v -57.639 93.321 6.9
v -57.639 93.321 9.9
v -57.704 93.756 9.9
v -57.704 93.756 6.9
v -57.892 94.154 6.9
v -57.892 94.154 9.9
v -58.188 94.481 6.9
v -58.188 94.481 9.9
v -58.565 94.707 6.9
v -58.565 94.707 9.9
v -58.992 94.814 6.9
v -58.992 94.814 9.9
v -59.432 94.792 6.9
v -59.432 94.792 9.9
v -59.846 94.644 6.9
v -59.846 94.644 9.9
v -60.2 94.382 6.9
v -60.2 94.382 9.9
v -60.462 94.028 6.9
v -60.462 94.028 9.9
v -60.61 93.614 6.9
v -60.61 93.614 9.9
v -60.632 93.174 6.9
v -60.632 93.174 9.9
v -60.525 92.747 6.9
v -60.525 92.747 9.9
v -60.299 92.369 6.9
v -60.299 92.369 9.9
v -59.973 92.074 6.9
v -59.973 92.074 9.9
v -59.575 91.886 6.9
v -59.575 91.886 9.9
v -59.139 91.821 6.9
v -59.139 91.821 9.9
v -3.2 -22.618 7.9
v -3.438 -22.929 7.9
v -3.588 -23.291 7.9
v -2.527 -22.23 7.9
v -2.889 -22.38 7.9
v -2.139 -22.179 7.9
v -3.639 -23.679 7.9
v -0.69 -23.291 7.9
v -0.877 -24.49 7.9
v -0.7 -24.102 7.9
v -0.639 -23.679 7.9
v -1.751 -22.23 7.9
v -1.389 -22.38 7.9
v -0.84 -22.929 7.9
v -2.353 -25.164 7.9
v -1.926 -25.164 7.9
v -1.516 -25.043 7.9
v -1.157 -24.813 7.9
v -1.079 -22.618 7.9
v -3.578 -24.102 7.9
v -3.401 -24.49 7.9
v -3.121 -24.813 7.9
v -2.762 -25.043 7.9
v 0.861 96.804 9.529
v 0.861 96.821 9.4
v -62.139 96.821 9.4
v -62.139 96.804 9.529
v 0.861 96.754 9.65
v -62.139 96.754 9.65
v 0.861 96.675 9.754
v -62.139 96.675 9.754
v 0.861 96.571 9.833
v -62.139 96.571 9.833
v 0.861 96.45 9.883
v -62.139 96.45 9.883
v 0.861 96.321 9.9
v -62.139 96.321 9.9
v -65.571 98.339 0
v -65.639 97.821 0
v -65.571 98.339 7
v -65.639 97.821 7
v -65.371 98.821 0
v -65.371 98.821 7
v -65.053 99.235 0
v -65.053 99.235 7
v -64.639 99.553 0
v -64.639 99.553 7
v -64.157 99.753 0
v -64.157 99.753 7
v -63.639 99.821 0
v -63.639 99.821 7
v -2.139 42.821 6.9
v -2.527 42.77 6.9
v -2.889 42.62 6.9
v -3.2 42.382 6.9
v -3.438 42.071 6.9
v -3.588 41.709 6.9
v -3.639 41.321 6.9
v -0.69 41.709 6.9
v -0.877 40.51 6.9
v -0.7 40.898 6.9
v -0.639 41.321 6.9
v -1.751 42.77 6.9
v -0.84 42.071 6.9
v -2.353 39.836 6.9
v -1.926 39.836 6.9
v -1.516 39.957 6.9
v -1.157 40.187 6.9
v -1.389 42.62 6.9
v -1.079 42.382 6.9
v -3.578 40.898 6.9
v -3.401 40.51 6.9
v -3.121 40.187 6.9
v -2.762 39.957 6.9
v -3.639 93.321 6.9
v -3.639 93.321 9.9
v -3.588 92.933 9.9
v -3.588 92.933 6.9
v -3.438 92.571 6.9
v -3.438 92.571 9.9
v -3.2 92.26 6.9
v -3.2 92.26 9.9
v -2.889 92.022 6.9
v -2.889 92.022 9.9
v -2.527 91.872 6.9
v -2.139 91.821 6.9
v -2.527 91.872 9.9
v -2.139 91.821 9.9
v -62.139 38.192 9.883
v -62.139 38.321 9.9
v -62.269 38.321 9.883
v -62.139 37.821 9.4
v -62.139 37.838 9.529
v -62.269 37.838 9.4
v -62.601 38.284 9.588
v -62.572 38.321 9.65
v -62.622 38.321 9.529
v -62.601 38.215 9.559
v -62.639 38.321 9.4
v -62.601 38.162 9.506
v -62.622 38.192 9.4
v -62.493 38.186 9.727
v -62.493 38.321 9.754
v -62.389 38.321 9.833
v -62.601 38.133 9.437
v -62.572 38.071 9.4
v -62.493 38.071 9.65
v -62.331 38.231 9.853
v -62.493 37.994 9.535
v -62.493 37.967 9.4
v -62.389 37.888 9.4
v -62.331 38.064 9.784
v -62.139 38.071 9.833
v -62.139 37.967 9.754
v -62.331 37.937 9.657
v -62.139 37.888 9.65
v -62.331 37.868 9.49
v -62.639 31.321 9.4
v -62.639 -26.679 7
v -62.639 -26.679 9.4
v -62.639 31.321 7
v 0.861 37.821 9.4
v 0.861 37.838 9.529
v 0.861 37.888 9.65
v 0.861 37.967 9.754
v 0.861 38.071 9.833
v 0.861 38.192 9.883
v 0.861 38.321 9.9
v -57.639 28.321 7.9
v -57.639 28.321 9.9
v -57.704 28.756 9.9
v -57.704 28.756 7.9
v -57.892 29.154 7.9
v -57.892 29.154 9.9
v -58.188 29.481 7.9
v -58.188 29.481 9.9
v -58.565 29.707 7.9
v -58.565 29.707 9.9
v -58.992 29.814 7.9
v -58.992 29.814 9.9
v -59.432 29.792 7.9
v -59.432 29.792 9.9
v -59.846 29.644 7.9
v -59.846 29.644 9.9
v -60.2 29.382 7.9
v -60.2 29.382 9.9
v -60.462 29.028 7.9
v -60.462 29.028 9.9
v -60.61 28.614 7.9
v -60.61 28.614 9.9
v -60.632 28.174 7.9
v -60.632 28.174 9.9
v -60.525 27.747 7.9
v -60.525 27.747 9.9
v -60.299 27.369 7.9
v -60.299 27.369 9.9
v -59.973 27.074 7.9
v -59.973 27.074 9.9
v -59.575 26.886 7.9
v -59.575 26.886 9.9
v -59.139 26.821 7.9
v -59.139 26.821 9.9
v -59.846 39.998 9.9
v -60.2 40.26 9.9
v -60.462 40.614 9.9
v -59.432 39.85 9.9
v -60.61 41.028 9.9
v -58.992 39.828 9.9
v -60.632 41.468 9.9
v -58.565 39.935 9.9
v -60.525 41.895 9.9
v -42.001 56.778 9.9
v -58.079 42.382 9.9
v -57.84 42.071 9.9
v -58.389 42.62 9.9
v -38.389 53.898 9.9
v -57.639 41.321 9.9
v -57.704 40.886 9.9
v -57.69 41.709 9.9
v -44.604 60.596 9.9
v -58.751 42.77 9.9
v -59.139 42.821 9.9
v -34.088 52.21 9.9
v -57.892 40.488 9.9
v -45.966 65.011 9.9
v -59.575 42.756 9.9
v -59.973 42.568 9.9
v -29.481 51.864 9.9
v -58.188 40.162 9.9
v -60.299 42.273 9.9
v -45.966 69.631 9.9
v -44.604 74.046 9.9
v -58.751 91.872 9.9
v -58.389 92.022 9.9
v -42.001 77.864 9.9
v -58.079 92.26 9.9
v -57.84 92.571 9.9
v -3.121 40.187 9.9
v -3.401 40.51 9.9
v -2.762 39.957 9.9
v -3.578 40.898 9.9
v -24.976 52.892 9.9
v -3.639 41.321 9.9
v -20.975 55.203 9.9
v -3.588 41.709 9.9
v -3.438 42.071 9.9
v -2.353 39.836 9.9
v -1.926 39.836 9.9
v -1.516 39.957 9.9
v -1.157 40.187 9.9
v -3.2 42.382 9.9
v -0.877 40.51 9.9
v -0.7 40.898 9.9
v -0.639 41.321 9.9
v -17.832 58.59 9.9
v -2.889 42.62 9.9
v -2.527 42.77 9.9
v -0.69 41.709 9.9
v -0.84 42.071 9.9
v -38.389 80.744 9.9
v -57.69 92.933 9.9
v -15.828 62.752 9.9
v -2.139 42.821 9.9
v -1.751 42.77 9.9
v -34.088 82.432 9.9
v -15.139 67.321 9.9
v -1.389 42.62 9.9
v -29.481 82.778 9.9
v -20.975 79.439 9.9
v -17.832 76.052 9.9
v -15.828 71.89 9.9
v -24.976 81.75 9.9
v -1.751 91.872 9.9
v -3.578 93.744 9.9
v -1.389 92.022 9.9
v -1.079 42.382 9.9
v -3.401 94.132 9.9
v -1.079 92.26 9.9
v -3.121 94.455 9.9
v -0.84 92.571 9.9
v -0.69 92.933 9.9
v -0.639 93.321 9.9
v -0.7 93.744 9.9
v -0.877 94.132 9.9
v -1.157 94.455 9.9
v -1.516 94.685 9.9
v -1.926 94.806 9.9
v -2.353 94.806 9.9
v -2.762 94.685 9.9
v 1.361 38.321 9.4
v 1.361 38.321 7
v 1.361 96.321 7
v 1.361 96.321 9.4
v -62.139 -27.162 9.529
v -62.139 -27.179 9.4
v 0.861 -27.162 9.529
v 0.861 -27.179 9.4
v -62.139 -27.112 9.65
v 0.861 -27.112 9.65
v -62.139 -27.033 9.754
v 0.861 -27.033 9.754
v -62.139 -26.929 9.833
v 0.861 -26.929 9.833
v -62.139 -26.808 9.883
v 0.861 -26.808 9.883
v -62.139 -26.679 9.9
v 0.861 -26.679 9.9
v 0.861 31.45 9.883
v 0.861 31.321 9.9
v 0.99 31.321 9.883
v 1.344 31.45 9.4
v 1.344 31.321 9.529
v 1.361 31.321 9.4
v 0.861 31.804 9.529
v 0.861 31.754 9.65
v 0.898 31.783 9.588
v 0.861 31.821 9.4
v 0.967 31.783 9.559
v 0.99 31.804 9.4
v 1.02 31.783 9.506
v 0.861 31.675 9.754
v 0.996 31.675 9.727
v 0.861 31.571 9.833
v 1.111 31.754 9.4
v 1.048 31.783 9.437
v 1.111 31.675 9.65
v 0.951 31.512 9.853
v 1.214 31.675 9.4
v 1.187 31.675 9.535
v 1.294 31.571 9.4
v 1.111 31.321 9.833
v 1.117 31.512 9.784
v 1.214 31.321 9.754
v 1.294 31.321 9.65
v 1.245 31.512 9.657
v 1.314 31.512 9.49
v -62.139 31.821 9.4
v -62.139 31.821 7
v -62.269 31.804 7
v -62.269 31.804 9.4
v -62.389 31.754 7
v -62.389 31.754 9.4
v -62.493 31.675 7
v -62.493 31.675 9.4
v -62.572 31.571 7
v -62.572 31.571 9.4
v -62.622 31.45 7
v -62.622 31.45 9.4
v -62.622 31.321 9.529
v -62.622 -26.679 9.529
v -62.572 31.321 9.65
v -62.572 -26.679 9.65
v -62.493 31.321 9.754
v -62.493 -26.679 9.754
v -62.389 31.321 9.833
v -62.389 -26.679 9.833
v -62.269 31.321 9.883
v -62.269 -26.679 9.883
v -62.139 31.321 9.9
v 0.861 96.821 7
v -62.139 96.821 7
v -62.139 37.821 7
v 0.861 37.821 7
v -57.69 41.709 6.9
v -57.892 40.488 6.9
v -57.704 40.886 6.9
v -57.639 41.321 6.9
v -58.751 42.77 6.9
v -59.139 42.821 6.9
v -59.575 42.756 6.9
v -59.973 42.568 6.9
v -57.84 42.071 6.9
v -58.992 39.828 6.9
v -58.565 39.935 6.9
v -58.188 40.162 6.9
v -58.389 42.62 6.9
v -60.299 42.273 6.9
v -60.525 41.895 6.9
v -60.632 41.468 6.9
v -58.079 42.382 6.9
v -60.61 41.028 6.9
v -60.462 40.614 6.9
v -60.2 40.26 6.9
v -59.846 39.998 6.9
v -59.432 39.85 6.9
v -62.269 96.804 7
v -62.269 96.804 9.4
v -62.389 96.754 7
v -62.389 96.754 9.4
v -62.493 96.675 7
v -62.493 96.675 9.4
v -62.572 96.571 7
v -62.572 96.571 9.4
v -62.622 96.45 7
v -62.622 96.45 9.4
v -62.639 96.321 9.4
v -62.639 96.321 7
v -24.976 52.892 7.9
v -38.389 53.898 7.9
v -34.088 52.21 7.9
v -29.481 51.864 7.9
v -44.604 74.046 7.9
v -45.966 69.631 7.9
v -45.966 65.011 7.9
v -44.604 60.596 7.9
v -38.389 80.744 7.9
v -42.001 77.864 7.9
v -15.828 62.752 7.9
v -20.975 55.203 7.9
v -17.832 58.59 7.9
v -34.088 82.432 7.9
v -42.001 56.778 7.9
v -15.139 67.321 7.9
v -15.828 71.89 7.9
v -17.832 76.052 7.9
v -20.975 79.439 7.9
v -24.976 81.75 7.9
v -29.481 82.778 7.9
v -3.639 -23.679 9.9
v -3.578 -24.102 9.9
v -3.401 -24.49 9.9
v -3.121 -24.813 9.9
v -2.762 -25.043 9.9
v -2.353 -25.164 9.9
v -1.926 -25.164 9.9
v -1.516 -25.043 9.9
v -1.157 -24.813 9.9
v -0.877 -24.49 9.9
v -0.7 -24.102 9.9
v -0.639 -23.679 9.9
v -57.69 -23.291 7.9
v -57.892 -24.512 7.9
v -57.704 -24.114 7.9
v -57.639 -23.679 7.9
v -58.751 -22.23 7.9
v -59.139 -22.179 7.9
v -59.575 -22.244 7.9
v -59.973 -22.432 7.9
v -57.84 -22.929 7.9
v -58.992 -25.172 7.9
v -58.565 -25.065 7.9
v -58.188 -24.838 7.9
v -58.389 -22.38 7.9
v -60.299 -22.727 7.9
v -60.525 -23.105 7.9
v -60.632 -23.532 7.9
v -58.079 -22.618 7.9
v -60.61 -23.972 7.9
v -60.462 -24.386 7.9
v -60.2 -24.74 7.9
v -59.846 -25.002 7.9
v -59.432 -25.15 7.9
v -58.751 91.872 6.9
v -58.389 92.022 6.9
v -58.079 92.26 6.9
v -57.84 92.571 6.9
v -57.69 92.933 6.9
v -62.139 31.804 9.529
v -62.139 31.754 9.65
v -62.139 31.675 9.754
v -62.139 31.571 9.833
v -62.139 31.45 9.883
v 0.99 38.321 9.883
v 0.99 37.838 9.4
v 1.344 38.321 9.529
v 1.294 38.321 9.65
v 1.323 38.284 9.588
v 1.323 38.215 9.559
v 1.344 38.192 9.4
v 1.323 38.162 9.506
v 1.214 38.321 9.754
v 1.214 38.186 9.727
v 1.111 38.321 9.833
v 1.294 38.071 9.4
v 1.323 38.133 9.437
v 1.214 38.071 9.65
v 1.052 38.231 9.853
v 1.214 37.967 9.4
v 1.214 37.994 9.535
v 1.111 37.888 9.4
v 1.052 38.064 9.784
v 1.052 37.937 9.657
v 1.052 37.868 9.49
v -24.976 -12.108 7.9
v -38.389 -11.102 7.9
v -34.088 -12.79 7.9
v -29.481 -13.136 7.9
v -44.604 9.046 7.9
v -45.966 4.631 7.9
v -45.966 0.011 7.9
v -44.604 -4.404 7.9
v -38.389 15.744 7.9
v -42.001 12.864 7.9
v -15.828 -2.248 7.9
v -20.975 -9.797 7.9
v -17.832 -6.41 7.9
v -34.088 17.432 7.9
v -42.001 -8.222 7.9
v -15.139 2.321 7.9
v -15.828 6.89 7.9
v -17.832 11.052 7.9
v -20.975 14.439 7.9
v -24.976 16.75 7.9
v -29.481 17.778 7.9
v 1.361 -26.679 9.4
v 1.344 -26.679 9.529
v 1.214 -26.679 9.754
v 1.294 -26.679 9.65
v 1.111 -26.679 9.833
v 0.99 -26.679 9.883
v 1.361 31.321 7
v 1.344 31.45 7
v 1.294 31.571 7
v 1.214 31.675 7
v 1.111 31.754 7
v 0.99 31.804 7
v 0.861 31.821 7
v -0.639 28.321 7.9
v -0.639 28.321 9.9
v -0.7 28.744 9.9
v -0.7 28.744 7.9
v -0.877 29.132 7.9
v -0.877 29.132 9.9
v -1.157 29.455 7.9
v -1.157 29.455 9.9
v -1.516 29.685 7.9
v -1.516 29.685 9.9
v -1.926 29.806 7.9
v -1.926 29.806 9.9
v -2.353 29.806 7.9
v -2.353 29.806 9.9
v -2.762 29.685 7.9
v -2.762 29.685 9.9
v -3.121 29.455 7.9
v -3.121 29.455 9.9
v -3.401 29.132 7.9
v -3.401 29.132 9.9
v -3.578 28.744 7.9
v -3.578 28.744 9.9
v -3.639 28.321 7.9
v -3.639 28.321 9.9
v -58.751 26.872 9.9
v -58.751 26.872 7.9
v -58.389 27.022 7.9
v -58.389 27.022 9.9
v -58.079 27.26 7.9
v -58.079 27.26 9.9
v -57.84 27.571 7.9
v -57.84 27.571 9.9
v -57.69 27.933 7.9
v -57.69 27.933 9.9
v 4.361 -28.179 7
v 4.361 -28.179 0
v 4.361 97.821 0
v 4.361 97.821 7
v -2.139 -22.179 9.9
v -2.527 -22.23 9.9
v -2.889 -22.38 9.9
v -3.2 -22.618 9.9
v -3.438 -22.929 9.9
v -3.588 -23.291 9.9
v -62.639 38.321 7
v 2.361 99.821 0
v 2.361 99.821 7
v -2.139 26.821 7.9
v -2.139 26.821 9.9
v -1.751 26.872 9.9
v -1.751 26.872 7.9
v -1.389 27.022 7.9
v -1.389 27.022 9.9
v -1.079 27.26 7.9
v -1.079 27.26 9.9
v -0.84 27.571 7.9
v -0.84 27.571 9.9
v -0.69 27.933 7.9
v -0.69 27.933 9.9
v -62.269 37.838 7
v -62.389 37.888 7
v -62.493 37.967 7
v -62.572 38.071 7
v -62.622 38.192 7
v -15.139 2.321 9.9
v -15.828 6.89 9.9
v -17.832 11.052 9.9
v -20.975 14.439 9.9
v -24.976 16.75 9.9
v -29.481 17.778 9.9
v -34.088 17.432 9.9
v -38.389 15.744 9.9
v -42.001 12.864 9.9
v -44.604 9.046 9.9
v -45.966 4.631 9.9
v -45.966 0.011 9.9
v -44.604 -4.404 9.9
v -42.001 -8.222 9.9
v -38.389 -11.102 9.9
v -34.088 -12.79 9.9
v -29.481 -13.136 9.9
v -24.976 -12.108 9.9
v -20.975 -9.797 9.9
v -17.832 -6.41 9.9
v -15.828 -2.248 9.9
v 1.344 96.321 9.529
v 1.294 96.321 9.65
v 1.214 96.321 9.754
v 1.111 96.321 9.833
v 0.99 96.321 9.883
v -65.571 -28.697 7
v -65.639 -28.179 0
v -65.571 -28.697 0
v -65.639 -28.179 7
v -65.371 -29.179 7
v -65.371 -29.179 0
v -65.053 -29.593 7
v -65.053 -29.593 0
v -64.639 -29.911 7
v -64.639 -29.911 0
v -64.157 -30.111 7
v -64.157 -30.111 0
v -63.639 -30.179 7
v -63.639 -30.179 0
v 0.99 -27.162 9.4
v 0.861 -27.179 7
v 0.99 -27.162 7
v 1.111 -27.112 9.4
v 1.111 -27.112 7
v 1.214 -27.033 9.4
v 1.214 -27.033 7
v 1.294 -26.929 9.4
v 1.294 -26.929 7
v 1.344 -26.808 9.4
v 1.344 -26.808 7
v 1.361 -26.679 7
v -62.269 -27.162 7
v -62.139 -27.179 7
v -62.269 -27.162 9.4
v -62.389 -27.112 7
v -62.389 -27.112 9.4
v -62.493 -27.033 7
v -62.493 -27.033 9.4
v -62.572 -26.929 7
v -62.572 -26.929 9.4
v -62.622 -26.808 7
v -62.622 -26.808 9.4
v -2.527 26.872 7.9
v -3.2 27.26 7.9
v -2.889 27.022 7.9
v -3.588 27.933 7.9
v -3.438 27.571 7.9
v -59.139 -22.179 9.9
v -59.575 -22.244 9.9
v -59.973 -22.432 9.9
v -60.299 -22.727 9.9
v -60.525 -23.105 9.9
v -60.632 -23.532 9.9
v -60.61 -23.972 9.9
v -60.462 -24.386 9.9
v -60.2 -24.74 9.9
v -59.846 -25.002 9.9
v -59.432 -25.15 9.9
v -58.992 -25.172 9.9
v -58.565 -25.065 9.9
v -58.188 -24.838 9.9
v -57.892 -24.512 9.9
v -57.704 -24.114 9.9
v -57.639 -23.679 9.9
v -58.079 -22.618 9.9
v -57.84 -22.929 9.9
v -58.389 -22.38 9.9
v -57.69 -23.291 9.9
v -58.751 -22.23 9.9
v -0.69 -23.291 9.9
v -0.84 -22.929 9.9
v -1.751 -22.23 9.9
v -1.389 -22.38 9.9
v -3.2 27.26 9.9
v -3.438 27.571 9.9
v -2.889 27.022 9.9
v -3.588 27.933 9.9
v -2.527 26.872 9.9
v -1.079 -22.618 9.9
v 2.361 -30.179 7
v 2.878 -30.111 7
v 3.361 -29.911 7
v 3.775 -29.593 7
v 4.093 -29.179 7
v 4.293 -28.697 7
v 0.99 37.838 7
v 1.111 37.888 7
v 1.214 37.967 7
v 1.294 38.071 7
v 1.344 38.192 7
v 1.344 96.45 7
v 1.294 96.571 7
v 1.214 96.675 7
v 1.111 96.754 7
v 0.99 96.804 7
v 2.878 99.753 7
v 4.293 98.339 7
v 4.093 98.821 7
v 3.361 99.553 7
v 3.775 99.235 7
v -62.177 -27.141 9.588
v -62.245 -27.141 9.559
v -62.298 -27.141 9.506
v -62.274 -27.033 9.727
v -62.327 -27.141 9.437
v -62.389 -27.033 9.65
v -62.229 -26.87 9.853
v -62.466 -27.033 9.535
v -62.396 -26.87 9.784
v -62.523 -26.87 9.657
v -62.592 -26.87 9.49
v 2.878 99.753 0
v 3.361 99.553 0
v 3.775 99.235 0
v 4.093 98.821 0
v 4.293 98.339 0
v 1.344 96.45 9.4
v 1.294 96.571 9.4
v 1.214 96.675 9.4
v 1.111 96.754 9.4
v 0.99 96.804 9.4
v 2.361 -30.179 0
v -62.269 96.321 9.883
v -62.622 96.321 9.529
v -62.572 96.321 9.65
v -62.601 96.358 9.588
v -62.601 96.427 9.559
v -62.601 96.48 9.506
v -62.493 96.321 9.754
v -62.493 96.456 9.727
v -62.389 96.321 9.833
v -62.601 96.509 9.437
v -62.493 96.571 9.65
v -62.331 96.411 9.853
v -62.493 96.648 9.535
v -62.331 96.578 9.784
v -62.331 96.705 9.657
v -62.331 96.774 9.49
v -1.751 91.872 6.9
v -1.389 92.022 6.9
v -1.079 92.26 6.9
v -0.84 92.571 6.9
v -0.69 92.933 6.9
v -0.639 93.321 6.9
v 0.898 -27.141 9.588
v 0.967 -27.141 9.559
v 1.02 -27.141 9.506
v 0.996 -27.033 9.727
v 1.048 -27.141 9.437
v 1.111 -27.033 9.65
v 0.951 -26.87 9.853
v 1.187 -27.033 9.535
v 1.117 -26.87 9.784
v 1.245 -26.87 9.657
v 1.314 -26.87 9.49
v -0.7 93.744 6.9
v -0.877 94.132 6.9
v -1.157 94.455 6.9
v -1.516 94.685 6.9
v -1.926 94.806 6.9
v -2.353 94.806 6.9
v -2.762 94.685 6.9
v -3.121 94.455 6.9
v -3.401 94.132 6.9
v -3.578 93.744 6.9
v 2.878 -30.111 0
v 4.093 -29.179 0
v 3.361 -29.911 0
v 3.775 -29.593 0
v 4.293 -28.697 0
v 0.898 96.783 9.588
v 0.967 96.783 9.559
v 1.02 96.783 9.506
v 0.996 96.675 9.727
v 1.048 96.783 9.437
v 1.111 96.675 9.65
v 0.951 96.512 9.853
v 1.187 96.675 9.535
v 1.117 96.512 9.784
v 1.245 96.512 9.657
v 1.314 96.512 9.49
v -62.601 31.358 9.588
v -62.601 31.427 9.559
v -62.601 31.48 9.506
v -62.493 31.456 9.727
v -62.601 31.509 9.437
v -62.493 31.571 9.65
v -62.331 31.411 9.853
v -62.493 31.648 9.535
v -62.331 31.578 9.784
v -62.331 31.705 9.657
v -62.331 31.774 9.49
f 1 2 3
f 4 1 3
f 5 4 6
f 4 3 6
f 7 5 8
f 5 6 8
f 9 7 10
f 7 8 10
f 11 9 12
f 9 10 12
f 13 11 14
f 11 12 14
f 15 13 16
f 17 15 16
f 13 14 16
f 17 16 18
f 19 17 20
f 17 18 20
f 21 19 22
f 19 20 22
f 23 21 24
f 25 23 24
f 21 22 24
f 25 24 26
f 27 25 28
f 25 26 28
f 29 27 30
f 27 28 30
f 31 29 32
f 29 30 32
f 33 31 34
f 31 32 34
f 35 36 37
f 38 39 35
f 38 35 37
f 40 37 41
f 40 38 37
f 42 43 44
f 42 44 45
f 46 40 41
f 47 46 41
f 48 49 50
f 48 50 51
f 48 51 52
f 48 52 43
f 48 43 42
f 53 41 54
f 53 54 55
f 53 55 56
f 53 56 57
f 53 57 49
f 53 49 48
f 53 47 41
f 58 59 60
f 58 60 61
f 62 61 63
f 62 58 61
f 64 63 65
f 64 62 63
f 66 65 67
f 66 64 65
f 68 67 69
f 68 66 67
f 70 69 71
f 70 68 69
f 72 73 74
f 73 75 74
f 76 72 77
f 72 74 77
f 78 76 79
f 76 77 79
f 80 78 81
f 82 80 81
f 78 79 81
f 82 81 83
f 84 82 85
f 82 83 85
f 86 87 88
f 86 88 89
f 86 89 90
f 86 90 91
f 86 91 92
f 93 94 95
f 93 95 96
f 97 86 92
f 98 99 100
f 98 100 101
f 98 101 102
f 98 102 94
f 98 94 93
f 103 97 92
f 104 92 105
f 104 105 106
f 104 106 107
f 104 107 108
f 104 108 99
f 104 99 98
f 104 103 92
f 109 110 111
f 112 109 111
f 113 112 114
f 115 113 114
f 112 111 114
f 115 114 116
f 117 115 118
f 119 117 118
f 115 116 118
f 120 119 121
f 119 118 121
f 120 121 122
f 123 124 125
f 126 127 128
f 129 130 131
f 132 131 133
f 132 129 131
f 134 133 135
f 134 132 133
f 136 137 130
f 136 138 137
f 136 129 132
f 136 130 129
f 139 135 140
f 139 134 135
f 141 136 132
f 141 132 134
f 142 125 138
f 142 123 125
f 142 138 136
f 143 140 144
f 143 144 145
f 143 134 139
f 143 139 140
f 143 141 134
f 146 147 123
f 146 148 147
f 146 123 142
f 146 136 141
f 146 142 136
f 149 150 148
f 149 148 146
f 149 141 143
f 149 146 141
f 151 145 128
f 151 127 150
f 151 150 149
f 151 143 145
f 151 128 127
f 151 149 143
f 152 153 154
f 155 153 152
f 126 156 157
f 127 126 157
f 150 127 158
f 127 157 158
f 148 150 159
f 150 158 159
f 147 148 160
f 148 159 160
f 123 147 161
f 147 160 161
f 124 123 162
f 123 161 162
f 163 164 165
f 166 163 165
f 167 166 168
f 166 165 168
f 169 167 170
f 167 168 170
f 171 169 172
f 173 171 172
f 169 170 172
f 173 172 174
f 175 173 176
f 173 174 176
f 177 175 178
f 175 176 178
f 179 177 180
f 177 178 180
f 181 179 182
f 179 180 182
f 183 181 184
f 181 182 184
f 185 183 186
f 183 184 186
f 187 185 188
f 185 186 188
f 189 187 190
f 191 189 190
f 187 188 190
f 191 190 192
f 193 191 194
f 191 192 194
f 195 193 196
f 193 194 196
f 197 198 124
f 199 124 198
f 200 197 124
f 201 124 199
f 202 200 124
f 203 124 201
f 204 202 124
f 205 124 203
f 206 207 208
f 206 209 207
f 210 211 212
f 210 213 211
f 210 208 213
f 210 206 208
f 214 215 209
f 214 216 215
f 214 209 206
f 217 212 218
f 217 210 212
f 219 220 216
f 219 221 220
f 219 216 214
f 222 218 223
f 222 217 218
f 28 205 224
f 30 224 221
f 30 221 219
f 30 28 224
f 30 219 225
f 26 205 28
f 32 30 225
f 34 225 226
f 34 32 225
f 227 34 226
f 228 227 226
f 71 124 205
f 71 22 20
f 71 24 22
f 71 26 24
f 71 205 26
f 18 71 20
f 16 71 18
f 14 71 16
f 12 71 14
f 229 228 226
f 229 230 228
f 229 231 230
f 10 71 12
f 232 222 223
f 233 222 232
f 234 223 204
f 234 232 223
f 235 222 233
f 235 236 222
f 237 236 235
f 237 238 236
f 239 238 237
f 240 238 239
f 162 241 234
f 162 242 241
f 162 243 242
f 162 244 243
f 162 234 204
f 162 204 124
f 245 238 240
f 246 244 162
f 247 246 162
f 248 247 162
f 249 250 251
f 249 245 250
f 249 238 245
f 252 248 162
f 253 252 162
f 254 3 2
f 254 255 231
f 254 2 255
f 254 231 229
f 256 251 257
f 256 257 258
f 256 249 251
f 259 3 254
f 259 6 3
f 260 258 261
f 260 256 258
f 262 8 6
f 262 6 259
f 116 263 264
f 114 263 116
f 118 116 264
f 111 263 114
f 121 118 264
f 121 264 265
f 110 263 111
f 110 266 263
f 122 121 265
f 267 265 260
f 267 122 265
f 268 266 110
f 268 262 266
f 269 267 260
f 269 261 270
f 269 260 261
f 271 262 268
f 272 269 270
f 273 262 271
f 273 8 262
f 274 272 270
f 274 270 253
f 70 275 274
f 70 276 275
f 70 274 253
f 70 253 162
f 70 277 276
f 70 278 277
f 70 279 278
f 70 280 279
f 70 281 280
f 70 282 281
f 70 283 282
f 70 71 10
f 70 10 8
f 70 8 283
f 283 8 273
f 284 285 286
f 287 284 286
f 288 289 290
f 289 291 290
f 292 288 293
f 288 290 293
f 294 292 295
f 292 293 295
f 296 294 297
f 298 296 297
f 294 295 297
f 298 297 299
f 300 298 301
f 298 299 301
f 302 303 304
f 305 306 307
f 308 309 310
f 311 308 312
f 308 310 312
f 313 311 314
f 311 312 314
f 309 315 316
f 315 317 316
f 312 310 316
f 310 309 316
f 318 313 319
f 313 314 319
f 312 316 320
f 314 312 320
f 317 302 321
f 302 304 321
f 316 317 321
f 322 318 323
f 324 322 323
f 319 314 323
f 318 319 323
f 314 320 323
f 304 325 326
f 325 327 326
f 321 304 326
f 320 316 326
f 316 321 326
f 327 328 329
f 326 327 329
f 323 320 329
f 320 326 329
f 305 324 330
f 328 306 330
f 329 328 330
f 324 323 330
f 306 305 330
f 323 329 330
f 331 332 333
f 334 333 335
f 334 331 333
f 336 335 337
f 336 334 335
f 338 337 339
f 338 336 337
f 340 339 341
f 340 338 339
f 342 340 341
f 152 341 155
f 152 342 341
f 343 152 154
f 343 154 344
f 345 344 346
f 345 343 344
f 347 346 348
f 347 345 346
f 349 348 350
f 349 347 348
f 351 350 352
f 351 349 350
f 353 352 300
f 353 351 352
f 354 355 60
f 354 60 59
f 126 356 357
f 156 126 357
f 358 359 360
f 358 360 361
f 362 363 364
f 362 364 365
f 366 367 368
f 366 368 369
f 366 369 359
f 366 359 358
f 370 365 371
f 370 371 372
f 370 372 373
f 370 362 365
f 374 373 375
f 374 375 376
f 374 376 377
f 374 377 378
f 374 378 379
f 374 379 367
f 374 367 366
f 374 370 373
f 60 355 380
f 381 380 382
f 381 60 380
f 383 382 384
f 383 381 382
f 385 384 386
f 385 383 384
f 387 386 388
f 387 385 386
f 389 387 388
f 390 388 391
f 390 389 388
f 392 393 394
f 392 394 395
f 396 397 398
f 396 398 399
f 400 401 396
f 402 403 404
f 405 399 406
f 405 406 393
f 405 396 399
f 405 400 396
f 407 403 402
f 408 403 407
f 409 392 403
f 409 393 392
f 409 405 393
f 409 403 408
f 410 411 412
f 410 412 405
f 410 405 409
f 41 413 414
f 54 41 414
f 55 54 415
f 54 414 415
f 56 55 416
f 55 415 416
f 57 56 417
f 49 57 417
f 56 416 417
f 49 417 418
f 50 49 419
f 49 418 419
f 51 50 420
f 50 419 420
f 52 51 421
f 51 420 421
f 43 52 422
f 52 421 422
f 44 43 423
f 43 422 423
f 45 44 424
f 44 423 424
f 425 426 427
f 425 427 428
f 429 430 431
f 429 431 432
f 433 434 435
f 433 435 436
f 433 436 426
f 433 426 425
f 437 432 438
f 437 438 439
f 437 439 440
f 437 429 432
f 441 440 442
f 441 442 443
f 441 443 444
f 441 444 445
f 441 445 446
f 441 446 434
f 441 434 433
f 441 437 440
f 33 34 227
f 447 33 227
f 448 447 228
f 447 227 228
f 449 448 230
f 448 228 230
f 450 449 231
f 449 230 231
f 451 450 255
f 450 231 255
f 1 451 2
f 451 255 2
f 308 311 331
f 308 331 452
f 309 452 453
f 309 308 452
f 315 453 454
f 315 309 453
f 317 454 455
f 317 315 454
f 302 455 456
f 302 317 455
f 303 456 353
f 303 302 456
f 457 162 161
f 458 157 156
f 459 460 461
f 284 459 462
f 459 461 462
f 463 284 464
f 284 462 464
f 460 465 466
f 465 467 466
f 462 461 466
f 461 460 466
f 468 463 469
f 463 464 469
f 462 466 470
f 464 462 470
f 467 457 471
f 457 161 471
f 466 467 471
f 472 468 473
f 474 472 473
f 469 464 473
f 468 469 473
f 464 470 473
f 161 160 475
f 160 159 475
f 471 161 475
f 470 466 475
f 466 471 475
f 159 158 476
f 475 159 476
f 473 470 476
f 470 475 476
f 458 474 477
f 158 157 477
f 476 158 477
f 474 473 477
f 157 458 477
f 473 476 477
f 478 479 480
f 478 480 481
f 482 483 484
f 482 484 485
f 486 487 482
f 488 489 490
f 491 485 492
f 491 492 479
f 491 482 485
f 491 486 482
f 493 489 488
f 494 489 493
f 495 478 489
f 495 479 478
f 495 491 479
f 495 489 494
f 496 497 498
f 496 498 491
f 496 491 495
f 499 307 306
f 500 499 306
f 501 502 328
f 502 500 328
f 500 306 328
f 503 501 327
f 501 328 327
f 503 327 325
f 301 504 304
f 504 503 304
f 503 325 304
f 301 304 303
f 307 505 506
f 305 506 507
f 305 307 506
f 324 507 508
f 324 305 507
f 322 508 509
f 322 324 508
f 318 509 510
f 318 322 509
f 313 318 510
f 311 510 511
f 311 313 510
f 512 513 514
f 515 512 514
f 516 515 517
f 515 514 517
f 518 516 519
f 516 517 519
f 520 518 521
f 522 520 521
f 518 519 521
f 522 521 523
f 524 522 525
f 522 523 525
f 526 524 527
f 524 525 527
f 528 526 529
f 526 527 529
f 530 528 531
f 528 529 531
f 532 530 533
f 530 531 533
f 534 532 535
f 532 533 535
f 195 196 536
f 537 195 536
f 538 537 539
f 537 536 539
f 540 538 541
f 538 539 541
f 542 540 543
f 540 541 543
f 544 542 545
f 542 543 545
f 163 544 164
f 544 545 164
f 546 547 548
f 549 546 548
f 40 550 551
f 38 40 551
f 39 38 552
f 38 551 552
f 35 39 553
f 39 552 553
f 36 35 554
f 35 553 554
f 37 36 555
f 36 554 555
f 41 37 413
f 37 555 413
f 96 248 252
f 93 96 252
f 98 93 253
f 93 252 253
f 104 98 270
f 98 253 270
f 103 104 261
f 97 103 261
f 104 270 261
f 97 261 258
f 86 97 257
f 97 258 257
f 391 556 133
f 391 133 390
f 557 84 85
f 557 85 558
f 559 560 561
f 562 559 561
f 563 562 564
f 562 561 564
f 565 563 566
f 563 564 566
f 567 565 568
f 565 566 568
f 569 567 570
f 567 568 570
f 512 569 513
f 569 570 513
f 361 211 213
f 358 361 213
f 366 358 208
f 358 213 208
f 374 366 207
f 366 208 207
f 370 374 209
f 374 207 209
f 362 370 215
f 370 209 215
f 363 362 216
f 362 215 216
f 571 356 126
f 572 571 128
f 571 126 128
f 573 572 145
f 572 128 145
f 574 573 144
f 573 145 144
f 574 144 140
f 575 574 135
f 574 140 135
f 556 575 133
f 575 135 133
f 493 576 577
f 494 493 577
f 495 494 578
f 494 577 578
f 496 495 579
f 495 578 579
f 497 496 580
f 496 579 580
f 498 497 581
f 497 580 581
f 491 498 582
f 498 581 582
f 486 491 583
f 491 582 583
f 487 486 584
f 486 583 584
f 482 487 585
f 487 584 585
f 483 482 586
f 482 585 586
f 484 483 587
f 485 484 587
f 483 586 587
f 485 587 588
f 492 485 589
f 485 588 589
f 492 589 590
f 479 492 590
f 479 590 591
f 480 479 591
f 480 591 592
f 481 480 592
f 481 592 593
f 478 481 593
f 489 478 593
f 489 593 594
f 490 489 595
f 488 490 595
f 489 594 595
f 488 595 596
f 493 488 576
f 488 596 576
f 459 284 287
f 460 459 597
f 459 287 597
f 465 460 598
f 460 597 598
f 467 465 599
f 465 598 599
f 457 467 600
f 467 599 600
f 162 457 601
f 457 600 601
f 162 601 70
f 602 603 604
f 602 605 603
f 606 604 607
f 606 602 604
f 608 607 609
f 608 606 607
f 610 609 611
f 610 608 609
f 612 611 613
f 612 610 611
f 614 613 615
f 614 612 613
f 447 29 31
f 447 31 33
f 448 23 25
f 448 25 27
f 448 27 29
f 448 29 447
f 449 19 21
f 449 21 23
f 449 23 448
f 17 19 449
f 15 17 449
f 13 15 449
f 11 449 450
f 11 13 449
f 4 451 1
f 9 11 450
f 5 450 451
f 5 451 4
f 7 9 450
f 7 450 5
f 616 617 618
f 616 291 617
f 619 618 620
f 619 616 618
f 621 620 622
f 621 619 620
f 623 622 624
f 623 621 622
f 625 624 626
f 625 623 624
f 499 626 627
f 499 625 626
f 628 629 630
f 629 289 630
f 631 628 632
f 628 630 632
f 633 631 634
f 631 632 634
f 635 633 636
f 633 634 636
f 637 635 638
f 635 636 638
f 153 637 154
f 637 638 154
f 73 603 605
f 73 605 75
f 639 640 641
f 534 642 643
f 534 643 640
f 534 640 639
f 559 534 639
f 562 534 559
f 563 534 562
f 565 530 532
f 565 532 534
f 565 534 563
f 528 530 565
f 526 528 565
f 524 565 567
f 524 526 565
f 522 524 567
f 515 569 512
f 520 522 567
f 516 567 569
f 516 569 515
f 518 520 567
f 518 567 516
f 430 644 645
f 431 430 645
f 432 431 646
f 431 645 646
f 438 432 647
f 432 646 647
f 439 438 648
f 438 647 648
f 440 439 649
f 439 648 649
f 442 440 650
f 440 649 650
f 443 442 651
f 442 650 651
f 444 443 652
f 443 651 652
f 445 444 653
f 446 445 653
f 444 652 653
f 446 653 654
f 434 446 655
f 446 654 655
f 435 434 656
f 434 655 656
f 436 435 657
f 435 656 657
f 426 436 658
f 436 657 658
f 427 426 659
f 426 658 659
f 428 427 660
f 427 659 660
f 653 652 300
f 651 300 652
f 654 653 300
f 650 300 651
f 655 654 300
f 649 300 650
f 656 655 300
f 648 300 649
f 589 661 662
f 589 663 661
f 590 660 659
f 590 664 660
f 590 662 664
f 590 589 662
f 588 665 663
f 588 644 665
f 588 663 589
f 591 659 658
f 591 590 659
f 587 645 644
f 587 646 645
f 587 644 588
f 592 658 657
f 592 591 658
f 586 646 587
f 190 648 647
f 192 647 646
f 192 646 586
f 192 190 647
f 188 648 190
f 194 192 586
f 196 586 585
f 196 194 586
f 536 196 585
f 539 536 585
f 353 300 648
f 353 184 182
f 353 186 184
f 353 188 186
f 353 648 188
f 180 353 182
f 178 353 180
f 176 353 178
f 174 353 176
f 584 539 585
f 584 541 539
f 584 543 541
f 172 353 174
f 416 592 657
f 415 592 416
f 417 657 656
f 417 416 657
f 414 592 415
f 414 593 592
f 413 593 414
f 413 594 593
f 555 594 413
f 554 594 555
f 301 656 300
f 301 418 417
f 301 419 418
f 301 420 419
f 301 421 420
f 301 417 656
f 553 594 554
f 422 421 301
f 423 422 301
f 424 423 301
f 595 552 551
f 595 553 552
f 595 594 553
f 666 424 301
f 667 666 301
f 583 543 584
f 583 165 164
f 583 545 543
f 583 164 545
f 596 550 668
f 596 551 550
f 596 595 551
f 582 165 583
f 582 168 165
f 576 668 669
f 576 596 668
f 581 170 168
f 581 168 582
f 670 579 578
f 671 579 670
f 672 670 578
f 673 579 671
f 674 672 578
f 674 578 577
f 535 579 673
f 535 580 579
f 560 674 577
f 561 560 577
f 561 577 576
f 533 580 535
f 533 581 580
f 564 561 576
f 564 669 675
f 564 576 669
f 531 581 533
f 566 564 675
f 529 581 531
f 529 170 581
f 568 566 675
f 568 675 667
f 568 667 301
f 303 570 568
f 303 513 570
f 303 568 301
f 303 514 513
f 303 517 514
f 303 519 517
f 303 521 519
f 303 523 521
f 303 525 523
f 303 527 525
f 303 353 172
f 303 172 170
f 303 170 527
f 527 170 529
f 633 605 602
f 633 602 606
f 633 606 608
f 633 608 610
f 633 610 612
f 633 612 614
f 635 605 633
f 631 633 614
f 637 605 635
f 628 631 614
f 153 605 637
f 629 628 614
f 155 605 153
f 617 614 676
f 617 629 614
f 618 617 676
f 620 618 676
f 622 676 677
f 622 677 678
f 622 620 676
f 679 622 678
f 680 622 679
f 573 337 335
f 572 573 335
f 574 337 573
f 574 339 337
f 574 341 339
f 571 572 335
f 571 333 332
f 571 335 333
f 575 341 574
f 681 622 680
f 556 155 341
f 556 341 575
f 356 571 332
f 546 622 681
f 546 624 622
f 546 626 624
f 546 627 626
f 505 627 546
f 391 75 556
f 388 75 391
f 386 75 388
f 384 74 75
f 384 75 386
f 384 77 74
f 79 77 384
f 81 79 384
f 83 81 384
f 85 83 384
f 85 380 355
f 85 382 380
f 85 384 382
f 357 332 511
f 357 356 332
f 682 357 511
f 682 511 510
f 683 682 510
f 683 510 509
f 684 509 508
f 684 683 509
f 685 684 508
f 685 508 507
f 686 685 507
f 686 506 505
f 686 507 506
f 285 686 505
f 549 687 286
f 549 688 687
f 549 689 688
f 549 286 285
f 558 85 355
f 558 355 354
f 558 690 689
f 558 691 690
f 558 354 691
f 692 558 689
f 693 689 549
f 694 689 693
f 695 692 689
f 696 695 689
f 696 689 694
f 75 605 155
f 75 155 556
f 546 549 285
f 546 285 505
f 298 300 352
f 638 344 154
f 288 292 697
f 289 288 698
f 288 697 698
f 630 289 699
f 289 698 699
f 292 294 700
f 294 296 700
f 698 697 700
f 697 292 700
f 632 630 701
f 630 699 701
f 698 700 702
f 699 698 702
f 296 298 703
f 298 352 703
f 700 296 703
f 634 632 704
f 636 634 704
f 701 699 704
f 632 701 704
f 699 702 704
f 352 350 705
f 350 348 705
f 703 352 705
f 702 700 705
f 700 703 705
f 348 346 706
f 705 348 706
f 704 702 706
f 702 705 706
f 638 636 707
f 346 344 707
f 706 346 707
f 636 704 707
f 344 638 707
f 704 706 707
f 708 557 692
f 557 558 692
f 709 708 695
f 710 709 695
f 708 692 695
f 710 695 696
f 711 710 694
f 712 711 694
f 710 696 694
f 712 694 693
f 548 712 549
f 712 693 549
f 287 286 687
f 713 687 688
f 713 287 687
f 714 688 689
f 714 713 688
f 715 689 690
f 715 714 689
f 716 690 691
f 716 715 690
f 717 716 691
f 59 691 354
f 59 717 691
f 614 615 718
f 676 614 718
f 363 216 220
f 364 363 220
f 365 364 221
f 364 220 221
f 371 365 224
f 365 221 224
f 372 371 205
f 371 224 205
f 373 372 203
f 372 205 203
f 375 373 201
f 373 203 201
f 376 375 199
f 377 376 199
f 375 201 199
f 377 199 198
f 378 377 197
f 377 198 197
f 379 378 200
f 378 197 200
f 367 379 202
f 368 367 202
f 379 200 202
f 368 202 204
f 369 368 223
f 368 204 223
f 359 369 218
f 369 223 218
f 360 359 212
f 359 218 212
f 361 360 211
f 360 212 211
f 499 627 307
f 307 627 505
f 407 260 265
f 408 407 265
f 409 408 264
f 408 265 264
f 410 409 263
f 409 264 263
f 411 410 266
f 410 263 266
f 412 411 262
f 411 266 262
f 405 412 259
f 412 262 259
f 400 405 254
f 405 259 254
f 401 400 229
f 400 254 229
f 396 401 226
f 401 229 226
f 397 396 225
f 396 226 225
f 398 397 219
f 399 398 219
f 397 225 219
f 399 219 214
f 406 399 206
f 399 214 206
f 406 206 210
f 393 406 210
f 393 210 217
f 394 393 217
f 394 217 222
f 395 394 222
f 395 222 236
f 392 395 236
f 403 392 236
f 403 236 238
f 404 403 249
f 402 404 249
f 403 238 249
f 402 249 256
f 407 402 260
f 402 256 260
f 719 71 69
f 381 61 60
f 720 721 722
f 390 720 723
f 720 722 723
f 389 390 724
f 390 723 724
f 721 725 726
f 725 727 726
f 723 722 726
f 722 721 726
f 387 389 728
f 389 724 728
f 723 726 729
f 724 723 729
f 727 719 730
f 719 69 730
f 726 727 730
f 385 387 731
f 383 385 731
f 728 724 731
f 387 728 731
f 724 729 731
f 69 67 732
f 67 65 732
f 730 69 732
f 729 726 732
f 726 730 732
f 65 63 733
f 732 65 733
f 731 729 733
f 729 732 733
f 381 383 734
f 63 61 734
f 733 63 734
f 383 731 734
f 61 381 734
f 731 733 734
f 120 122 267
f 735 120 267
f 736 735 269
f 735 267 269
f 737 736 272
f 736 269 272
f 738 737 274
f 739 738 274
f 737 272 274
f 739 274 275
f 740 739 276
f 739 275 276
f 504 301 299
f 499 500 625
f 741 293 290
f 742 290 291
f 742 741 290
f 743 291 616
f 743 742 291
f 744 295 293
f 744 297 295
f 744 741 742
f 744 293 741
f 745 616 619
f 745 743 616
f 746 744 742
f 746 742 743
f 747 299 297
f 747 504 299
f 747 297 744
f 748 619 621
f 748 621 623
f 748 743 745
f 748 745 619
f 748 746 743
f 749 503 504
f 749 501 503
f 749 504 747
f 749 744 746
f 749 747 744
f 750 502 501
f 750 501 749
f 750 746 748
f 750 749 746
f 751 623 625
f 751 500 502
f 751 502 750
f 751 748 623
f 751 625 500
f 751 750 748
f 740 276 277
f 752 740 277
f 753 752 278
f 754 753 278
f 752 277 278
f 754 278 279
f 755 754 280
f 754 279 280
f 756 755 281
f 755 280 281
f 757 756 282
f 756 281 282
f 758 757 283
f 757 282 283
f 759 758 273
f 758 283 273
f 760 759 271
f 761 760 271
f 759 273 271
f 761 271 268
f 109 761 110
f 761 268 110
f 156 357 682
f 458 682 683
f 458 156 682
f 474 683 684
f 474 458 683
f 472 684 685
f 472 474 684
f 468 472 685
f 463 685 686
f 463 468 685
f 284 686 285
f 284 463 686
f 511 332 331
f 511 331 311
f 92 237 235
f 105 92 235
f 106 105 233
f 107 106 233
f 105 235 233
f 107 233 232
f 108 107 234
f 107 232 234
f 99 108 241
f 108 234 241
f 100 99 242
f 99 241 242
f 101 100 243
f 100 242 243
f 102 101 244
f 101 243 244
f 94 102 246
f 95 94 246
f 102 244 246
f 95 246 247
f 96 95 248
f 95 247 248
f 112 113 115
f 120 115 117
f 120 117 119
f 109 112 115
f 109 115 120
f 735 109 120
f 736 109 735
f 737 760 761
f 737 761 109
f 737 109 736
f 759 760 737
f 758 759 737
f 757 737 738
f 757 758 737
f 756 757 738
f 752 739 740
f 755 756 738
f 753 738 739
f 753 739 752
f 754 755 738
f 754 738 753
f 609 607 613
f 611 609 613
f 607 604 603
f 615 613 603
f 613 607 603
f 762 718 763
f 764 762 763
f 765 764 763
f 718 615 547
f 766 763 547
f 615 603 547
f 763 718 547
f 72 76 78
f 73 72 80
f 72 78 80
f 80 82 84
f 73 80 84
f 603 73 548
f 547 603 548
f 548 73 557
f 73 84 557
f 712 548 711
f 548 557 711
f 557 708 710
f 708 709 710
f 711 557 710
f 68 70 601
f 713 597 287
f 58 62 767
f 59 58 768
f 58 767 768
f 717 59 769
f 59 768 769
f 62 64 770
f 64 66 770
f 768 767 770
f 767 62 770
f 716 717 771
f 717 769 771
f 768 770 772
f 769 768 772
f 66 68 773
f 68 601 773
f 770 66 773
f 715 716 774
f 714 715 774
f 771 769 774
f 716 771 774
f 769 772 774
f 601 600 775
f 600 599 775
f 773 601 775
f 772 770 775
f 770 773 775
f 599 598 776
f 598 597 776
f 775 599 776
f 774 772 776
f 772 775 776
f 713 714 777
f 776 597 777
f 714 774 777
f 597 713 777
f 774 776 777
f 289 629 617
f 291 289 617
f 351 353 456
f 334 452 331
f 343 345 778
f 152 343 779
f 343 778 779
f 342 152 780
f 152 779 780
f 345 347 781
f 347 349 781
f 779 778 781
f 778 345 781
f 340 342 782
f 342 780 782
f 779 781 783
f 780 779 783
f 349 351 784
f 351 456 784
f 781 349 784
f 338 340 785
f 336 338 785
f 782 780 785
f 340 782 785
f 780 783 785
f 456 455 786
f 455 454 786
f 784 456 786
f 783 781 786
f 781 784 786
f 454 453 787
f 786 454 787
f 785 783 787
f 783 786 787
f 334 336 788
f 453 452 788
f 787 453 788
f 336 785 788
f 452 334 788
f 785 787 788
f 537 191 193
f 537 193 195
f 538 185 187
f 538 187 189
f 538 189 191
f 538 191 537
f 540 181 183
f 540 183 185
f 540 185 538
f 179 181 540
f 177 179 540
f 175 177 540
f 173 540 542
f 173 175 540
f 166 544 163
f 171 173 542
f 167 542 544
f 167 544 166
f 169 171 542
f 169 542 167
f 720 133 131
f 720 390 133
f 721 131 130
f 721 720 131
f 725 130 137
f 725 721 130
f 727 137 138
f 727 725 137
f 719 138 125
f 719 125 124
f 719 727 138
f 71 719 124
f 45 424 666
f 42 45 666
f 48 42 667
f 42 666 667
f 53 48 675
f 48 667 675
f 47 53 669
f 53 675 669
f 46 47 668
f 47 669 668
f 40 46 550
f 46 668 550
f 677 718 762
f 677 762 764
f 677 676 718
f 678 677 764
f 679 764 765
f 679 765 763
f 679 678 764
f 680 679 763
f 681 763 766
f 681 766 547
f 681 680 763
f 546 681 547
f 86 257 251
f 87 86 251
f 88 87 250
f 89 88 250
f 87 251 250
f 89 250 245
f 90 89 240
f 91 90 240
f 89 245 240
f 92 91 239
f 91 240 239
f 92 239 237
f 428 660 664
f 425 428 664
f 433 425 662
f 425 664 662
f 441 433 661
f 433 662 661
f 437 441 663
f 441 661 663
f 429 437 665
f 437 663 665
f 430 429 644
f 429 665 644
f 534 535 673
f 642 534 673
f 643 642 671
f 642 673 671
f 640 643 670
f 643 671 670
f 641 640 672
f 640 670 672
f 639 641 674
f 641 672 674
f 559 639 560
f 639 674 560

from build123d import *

# Parameters (mm, degrees)
F0_W      = 70
F0_H      = 130
F1_DEPTH  = 7
F3_W      = 64
F3_H      = 59
F4_W      = 64
F4_H      = 59
F5_DEPTH  = 2.9
F7_DEPTH  = 3
F9_DEPTH  = 2
F10_R     = 0.5
F11_R     = 15.5
F12_DEPTH = 2
F13_R     = 15.5
F14_DEPTH = 2
F15_R     = 2


with BuildPart() as f1:
    # F0 (on Top) → F1 (new body)
    with BuildSketch(Plane.XY):
        with Locations((-30.63919, 34.821038)):
            Rectangle(F0_W, F0_H)
    extrude(amount=F1_DEPTH)

    # F3 (on face) + F4 (on face) → F5 (join)
    with BuildSketch(Plane.XY.offset(7)):
        with Locations((-30.63919, 67.321038)):
            Rectangle(F3_W, F3_H)
    with BuildSketch(Plane.XY.offset(7)):
        with Locations((-30.63919, 2.321038)):
            Rectangle(F4_W, F4_H)
    extrude(amount=F5_DEPTH)

    # F6 (on face) → F7 (cut)
    with BuildSketch(Plane.XY.offset(9.9)):
        with BuildLine():
            Line((-59.13919, 91.821038), (-59.13919, 93.321038))
            Line((-59.13919, 93.321038), (-57.63919, 93.321038))
            ThreePointArc((-57.63919, 93.321038), (-60.199851, 94.381698), (-59.13919, 91.821038))
        make_face()
        with BuildLine():
            Line((-57.63919, 93.321038), (-59.13919, 93.321038))
            Line((-59.13919, 93.321038), (-59.13919, 91.821038))
            ThreePointArc((-59.13919, 91.821038), (-58.07853, 92.260378), (-57.63919, 93.321038))
        make_face()
        with BuildLine():
            Line((-59.13919, 41.321038), (-59.13919, 42.821038))
            ThreePointArc((-59.13919, 42.821038), (-60.199851, 40.260378), (-57.63919, 41.321038))
            Line((-57.63919, 41.321038), (-59.13919, 41.321038))
        make_face()
        with BuildLine():
            ThreePointArc((-57.63919, 41.321038), (-58.07853, 42.381698), (-59.13919, 42.821038))
            Line((-59.13919, 42.821038), (-59.13919, 41.321038))
            Line((-59.13919, 41.321038), (-57.63919, 41.321038))
        make_face()
        with BuildLine():
            Line((-2.13919, 41.321038), (-3.63919, 41.321038))
            ThreePointArc((-3.63919, 41.321038), (-2.13919, 39.821038), (-0.63919, 41.321038))
            ThreePointArc((-0.63919, 41.321038), (-1.07853, 42.381698), (-2.13919, 42.821038))
            Line((-2.13919, 42.821038), (-2.13919, 41.321038))
        make_face()
        with BuildLine():
            ThreePointArc((-2.13919, 42.821038), (-3.199851, 42.381698), (-3.63919, 41.321038))
            Line((-3.63919, 41.321038), (-2.13919, 41.321038))
            Line((-2.13919, 41.321038), (-2.13919, 42.821038))
        make_face()
        with BuildLine():
            ThreePointArc((-0.63919, 93.321038), (-2.13919, 94.821038), (-3.63919, 93.321038))
            Line((-3.63919, 93.321038), (-2.13919, 93.321038))
            Line((-2.13919, 93.321038), (-2.13919, 91.821038))
            ThreePointArc((-2.13919, 91.821038), (-1.07853, 92.260378), (-0.63919, 93.321038))
        make_face()
        with BuildLine():
            Line((-2.13919, 93.321038), (-3.63919, 93.321038))
            ThreePointArc((-3.63919, 93.321038), (-3.199851, 92.260378), (-2.13919, 91.821038))
            Line((-2.13919, 91.821038), (-2.13919, 93.321038))
        make_face()
    extrude(amount=-F7_DEPTH, mode=Mode.SUBTRACT)

    # F8 (on face) → F9 (cut)
    with BuildSketch(Plane.XY.offset(9.9)):
        with BuildLine():
            Line((-59.13919, 28.321038), (-57.63919, 28.321038))
            ThreePointArc((-57.63919, 28.321038), (-60.199851, 29.381698), (-59.13919, 26.821038))
            Line((-59.13919, 26.821038), (-59.13919, 28.321038))
        make_face()
        with BuildLine():
            ThreePointArc((-59.13919, 26.821038), (-58.07853, 27.260378), (-57.63919, 28.321038))
            Line((-57.63919, 28.321038), (-59.13919, 28.321038))
            Line((-59.13919, 28.321038), (-59.13919, 26.821038))
        make_face()
        with BuildLine():
            Line((-59.13919, -23.678962), (-59.13919, -22.178962))
            ThreePointArc((-59.13919, -22.178962), (-60.199851, -24.739622), (-57.63919, -23.678962))
            Line((-57.63919, -23.678962), (-59.13919, -23.678962))
        make_face()
        with BuildLine():
            ThreePointArc((-57.63919, -23.678962), (-58.07853, -22.618302), (-59.13919, -22.178962))
            Line((-59.13919, -22.178962), (-59.13919, -23.678962))
            Line((-59.13919, -23.678962), (-57.63919, -23.678962))
        make_face()
        with BuildLine():
            ThreePointArc((-0.63919, 28.321038), (-2.13919, 29.821038), (-3.63919, 28.321038))
            Line((-3.63919, 28.321038), (-2.13919, 28.321038))
            Line((-2.13919, 28.321038), (-2.13919, 26.821038))
            ThreePointArc((-2.13919, 26.821038), (-1.07853, 27.260378), (-0.63919, 28.321038))
        make_face()
        with BuildLine():
            Line((-2.13919, 28.321038), (-3.63919, 28.321038))
            ThreePointArc((-3.63919, 28.321038), (-3.199851, 27.260378), (-2.13919, 26.821038))
            Line((-2.13919, 26.821038), (-2.13919, 28.321038))
        make_face()
        with BuildLine():
            ThreePointArc((-0.63919, -23.678962), (-1.07853, -22.618302), (-2.13919, -22.178962))
            Line((-2.13919, -22.178962), (-2.13919, -23.678962))
            Line((-2.13919, -23.678962), (-3.63919, -23.678962))
            ThreePointArc((-3.63919, -23.678962), (-2.13919, -25.178962), (-0.63919, -23.678962))
        make_face()
        with BuildLine():
            Line((-2.13919, -23.678962), (-2.13919, -22.178962))
            ThreePointArc((-2.13919, -22.178962), (-3.199851, -22.618302), (-3.63919, -23.678962))
            Line((-3.63919, -23.678962), (-2.13919, -23.678962))
        make_face()
    extrude(amount=-F9_DEPTH, mode=Mode.SUBTRACT)

    # F10
    f10_edges = [f1.edges().sort_by_distance(p)[0] for p in [
        (-30.63919, 37.821038, 9.9),
        (1.36081, 67.321038, 9.9),
        (1.36081, 2.321038, 9.9),
        (-30.63919, 31.821038, 9.9),
        (-30.63919, 96.821038, 9.9),
        (-62.63919, 67.321038, 9.9),
        (-62.63919, 2.321038, 9.9),
        (-30.63919, -27.178962, 9.9),
        (1.36081, -27.178962, 8.45),
        (1.36081, 31.821038, 8.45),
        (1.36081, 37.821038, 8.45),
        (1.36081, 96.821038, 8.45),
        (-62.63919, -27.178962, 8.45),
        (-62.63919, 31.821038, 8.45),
        (-62.63919, 37.821038, 8.45),
        (-62.63919, 96.821038, 8.45),
    ]]
    fillet(f10_edges, radius=F10_R)

    # F11 (on face) → F12 (cut)
    with BuildSketch(Plane.XY.offset(9.9)):
        with Locations((-30.63919, 2.321038)):
            Circle(F11_R)
    extrude(amount=-F12_DEPTH, mode=Mode.SUBTRACT)

    # F13 (on face) → F14 (cut)
    with BuildSketch(Plane.XY.offset(9.9)):
        with Locations((-30.63919, 67.321038)):
            Circle(F13_R)
    extrude(amount=-F14_DEPTH, mode=Mode.SUBTRACT)

    # F15
    f15_edges = [f1.edges().sort_by_distance(p)[0] for p in [
        (-65.63919, -30.178962, 3.5),
        (4.36081, -30.178962, 3.5),
        (4.36081, 99.821038, 3.5),
        (-65.63919, 99.821038, 3.5),
    ]]
    fillet(f15_edges, radius=F15_R)


solid = f1.part
